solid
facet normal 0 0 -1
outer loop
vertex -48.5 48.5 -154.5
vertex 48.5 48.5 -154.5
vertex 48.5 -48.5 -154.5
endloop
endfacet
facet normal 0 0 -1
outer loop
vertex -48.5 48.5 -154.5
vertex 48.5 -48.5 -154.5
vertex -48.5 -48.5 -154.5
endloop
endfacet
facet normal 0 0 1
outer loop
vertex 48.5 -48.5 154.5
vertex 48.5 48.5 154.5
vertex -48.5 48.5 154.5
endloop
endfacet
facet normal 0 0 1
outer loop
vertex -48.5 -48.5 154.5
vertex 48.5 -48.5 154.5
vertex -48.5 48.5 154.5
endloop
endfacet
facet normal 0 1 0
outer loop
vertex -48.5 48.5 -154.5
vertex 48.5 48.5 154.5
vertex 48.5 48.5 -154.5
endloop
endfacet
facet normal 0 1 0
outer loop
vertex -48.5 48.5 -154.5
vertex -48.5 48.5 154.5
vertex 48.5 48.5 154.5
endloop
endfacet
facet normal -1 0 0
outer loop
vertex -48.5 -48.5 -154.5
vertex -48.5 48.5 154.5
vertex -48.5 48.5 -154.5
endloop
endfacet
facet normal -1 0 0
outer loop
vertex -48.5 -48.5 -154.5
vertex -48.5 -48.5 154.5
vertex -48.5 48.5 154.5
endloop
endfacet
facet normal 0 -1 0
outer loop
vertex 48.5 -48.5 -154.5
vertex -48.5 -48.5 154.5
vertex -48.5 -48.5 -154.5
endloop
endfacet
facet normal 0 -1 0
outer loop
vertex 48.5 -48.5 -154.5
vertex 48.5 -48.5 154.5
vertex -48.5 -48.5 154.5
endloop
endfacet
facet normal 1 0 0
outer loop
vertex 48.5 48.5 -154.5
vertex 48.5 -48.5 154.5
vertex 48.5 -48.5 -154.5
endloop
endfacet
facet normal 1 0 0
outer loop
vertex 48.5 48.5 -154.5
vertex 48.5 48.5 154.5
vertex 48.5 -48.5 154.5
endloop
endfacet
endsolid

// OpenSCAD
linear_extrude(height = 309.0, twist = 0.0, scale = 1.0, slices = 1, center = true)
{
    scale([97.0, 97.0])
    {
        M52();
    }
}

module M52()
{
    polygon
    (
        points =
        [
            [-0.5, -0.5], 
            [0.5, -0.5], 
            [0.5, 0.5], 
            [-0.5, 0.5]
        ],
        paths =
        [
            [0, 1, 2, 3]
        ]
    );
}
